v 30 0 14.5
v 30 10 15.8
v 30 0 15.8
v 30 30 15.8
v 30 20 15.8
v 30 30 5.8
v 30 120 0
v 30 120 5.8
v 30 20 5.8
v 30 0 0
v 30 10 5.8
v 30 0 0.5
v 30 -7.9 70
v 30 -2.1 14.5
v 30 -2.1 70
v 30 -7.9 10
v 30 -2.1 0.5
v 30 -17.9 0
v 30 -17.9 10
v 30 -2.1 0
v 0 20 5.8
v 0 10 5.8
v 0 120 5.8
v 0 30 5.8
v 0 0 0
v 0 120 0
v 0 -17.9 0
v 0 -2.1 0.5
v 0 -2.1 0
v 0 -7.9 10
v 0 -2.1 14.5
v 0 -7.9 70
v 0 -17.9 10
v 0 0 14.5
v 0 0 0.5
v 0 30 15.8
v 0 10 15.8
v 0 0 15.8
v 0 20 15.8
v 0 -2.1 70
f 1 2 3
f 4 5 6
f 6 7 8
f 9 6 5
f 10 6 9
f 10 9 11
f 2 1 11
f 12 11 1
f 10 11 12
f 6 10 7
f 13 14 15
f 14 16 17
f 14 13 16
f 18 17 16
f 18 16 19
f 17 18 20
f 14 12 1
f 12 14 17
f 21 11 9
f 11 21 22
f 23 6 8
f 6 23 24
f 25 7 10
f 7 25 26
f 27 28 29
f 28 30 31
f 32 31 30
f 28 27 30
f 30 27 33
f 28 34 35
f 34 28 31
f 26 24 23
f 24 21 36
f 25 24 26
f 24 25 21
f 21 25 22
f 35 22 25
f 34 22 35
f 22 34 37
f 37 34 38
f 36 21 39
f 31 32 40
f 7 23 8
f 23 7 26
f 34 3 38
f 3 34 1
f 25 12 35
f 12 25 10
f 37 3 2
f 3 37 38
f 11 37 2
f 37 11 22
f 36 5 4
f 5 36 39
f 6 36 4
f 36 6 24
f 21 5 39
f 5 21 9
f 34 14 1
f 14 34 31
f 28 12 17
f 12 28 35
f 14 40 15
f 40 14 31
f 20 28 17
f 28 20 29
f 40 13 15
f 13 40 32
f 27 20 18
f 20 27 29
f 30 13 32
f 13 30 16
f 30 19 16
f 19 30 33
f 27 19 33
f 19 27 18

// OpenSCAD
// 2026-11-03: side section through a door bottom hook (looking along x): shell bottom
// panel, bottom 1010 frame member, foam, door and its outside 1010 frame, hook, floor rail.
t = 5.8; ext = 10; foam = 2.1;
w = 30;   // section slab along x
color([0.80, 0.88, 1.0]) translate([0, 0, 0]) cube([w, 120, t]);                       // shell bottom panel
color([0.75, 0.76, 0.78]) translate([0, 0, t]) cube([w, ext, ext]);                     // bottom frame member
color([0.75, 0.76, 0.78]) translate([0, 20, t]) cube([w, ext, ext]);                    // floor rail
color([0.25, 0.25, 0.25]) translate([0, -foam, 0.5]) cube([w, foam, 14]);              // foam
color([0.85, 0.92, 1.0]) translate([0, -foam - t, 0]) cube([w, t, 70]);                // door acrylic
color([0.75, 0.76, 0.78]) translate([0, -foam - t - ext, 0]) cube([w, ext, ext]);      // door frame, bottom
// 2026-11-11: stl/2026-11-03_door_hook.stl (superseded hook) removed from stl/; it is in git history (e8c96ab).
// color([0.2, 0.2, 0.22]) import("stl/2026-11-03_door_hook.stl");
